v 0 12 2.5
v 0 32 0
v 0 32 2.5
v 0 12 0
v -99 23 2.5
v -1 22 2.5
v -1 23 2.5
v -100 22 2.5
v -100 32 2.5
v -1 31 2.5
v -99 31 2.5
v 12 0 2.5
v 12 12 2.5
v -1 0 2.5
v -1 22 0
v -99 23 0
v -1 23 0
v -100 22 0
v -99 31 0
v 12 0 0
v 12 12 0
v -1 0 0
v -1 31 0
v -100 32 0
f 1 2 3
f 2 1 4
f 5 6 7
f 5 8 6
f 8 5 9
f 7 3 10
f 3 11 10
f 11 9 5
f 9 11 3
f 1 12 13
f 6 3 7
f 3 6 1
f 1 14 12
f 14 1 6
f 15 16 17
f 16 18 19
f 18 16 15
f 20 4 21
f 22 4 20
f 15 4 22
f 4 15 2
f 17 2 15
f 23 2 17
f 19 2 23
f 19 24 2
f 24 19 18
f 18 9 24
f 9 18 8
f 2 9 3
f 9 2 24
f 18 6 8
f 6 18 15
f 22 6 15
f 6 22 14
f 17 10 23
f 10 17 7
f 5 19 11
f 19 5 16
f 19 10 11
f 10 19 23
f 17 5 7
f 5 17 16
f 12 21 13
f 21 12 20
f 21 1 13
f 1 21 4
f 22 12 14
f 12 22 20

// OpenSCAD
cube([12, 12, 2.5]);
translate([-1, 0, 0]) cube([1, 12+20, 2.5]);
translate([-80-20, 12+20-10, 0]) difference() {
    cube([80+20, 10, 2.5]);
    translate([1, 1, 0]) cube([80+20-2, 10-2, 2.5]);
}
//translate([-80, 12+20-10+10/2, 30]) rotate([0, 90, 0]) cylinder(h=1, d=10);
